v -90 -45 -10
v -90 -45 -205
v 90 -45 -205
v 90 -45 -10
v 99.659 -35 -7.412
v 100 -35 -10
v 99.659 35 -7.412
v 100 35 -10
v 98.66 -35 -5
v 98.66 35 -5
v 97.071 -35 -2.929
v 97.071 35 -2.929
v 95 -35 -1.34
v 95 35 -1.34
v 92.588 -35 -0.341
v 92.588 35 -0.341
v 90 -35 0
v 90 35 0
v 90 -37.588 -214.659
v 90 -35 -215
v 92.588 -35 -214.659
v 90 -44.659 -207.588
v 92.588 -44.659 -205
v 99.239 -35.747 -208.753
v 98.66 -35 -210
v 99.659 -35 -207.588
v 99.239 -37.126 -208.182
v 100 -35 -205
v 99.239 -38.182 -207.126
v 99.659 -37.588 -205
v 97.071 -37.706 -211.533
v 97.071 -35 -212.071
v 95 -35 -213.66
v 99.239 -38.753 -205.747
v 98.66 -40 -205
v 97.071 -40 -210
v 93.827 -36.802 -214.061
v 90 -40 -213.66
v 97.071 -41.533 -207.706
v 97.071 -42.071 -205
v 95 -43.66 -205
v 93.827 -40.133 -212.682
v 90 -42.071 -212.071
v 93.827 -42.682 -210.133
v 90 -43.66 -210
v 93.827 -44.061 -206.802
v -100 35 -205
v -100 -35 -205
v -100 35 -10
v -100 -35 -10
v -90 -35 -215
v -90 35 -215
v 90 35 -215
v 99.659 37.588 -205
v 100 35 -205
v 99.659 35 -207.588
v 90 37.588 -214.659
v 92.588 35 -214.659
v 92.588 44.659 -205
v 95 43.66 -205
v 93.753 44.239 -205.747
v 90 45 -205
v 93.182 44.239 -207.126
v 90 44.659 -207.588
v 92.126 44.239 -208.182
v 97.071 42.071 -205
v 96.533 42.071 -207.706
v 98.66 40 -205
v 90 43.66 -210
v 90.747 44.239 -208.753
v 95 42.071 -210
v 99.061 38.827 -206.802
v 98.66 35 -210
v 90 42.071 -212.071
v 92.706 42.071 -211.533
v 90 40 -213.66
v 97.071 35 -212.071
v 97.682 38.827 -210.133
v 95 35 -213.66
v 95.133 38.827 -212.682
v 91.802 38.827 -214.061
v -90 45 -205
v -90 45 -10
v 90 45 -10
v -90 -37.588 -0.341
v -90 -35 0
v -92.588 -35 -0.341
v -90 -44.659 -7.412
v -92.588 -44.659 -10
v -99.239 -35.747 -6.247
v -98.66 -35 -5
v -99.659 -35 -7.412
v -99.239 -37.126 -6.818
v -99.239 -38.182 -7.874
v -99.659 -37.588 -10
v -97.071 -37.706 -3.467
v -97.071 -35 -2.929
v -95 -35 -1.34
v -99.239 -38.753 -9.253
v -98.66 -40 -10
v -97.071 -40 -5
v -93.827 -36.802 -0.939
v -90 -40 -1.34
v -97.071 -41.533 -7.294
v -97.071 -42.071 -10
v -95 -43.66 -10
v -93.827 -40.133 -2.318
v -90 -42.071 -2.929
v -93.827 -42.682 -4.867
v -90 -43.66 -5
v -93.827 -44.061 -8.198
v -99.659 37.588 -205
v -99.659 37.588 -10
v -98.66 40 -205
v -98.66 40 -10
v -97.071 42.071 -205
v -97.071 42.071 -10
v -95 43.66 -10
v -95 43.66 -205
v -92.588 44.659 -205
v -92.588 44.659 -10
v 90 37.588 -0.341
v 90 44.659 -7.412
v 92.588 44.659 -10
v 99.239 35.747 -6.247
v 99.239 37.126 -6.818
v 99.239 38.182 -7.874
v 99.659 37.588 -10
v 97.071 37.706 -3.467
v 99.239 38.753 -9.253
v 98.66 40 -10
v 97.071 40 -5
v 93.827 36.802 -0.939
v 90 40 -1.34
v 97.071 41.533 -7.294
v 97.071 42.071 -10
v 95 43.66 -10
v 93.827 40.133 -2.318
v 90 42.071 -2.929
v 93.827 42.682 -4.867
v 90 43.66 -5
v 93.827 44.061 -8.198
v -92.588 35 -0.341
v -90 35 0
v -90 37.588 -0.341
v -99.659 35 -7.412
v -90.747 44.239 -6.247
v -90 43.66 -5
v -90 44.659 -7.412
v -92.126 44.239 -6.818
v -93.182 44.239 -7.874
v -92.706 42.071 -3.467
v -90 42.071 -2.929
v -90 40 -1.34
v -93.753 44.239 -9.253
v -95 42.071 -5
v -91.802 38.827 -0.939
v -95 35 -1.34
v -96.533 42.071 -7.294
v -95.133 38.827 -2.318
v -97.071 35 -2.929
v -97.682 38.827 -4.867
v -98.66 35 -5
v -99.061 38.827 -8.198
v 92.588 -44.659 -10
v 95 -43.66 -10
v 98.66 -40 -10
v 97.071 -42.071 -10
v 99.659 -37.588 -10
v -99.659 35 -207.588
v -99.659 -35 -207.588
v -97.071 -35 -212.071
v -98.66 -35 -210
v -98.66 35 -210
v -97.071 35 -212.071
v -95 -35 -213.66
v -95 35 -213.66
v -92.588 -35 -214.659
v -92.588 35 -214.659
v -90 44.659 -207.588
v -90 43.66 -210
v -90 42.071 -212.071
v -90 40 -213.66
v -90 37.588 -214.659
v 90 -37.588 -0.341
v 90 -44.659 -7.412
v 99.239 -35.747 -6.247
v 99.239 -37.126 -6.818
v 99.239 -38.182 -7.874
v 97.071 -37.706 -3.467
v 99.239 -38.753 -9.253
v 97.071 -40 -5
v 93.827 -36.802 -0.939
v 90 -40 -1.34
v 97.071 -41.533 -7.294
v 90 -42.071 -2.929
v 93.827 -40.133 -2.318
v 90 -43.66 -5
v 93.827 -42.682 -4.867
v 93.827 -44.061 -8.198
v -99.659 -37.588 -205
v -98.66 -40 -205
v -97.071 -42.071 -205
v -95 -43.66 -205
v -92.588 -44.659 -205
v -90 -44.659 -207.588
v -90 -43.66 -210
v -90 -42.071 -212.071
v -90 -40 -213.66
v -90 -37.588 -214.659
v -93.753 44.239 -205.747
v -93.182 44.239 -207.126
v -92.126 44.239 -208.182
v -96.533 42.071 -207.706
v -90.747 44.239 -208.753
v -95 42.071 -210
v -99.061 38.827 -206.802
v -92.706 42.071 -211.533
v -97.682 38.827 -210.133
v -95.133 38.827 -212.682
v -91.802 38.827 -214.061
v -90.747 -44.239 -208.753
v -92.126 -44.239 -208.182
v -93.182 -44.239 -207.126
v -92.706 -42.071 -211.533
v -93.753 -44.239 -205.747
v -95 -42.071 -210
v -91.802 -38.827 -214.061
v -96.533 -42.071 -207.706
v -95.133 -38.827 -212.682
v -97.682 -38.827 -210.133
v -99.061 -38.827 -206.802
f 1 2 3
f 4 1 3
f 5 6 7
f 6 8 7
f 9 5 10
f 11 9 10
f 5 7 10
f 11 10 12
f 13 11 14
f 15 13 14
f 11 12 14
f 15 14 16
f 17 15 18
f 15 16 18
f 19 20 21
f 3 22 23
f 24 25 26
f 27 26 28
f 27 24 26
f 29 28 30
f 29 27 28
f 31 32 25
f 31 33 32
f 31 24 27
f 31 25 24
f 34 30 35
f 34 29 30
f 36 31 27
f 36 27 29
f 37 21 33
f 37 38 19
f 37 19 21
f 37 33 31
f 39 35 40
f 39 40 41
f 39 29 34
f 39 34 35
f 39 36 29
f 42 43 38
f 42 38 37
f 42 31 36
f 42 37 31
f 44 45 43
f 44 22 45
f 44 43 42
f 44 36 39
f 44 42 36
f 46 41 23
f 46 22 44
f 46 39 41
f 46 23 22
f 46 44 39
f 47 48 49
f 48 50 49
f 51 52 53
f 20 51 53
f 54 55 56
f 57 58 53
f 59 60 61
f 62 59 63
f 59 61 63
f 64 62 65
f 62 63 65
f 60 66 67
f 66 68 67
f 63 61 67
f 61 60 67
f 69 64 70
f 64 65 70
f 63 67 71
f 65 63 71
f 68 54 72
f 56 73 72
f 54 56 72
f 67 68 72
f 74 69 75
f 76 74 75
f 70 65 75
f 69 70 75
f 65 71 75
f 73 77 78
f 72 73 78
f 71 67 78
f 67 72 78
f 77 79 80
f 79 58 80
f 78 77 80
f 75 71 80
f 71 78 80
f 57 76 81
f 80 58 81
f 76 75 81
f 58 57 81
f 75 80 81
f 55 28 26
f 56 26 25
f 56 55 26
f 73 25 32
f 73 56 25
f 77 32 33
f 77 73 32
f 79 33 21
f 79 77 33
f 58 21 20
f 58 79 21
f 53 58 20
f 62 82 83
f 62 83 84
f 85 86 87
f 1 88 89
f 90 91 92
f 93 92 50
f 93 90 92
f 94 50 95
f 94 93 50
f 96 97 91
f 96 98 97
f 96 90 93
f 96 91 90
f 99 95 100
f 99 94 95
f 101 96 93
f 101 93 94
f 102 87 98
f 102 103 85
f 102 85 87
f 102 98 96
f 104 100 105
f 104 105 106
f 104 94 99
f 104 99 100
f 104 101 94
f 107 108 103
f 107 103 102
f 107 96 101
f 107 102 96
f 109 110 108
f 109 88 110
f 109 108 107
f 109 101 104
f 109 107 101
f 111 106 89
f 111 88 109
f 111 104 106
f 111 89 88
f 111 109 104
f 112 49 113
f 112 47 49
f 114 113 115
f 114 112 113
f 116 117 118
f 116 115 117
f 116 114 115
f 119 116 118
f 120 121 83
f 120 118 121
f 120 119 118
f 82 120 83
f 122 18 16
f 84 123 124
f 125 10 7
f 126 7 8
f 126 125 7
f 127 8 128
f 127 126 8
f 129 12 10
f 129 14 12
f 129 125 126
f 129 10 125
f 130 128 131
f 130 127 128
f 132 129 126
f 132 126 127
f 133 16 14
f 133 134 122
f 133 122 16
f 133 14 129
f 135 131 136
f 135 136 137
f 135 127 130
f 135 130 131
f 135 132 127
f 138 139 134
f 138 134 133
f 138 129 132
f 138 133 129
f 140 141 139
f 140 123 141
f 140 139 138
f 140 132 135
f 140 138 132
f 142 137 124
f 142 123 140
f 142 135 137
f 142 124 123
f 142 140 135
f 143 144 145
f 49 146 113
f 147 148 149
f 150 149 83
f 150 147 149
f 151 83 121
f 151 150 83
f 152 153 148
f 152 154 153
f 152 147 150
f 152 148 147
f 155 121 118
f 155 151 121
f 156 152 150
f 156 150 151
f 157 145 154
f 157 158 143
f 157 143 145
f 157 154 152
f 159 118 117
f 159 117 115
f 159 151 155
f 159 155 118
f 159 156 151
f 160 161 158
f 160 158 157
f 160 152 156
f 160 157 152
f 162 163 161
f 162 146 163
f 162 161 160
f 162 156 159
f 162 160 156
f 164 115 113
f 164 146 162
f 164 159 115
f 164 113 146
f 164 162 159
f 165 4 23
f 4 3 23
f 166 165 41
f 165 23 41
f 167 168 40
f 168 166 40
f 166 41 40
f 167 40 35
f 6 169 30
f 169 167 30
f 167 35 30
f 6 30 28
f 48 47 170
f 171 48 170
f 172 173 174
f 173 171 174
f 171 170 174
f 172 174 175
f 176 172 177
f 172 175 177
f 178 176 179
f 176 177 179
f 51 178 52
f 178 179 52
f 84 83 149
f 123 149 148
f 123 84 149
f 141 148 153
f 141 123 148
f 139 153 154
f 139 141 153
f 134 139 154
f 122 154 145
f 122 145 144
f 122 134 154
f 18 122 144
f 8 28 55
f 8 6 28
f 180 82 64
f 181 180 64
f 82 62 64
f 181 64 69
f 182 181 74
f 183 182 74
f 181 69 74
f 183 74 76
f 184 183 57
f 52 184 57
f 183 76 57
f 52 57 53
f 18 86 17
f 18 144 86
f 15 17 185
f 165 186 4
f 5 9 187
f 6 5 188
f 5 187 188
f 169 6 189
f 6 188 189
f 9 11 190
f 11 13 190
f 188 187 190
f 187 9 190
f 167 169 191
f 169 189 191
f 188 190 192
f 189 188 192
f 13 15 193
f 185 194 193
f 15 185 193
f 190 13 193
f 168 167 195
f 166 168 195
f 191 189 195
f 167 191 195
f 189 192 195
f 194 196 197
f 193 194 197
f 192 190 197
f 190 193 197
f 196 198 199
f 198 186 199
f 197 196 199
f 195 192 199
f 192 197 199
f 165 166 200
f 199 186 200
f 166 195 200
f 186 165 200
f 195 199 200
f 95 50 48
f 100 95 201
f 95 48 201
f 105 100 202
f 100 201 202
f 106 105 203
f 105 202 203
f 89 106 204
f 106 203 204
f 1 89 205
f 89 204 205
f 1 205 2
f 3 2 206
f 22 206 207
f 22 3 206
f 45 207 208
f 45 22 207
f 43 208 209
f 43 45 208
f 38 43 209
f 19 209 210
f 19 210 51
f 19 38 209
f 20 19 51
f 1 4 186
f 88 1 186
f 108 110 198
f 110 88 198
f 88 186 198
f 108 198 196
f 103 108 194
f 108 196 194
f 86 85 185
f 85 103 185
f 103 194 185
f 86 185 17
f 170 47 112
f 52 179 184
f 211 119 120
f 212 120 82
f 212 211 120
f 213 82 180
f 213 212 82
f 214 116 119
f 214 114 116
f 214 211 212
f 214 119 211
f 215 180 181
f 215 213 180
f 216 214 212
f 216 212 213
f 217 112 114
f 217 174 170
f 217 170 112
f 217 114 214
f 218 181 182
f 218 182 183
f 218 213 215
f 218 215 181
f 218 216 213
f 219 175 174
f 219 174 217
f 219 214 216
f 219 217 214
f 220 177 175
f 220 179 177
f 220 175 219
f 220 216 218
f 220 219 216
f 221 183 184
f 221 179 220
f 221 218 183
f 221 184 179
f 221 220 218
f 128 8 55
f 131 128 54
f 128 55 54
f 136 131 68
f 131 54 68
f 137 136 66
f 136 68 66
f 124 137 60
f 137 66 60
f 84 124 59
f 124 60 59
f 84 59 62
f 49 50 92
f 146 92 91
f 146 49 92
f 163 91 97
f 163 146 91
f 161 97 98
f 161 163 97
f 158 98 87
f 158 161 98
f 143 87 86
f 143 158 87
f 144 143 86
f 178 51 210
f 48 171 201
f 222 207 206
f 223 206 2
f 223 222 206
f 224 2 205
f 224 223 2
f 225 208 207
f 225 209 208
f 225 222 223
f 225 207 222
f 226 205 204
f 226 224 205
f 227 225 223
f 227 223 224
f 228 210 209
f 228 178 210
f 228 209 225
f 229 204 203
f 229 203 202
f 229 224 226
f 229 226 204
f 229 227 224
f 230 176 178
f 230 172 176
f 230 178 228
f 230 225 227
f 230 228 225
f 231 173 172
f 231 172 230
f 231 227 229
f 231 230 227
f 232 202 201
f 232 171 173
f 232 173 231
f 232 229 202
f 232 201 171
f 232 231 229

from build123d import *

# Parameters (mm, degrees)
ESQUISSE1_W        = 200
ESQUISSE1_H        = 90
BOSS_EXTRU_1_DEPTH = 215
CONG_1_R           = 10


with BuildPart() as part:
    # Esquisse1 → Boss.-Extru.1 (new body)
    with BuildSketch(Plane.XY):
        Rectangle(ESQUISSE1_W, ESQUISSE1_H)
    extrude(amount=-BOSS_EXTRU_1_DEPTH)

    # Congé1
    cong_1_edges = [part.edges().sort_by_distance(p)[0] for p in [
        (-100, 0, -215),
        (0, -45, -215),
        (100, 0, -215),
        (0, -45, 0),
        (-100, 0, 0),
        (0, 45, 0),
        (100, 0, 0),
        (100, -45, -107.5),
        (-100, -45, -107.5),
        (-100, 45, -107.5),
        (100, 45, -107.5),
        (0, 45, -215),
    ]]
    fillet(cong_1_edges, radius=CONG_1_R)


solid = part.part
